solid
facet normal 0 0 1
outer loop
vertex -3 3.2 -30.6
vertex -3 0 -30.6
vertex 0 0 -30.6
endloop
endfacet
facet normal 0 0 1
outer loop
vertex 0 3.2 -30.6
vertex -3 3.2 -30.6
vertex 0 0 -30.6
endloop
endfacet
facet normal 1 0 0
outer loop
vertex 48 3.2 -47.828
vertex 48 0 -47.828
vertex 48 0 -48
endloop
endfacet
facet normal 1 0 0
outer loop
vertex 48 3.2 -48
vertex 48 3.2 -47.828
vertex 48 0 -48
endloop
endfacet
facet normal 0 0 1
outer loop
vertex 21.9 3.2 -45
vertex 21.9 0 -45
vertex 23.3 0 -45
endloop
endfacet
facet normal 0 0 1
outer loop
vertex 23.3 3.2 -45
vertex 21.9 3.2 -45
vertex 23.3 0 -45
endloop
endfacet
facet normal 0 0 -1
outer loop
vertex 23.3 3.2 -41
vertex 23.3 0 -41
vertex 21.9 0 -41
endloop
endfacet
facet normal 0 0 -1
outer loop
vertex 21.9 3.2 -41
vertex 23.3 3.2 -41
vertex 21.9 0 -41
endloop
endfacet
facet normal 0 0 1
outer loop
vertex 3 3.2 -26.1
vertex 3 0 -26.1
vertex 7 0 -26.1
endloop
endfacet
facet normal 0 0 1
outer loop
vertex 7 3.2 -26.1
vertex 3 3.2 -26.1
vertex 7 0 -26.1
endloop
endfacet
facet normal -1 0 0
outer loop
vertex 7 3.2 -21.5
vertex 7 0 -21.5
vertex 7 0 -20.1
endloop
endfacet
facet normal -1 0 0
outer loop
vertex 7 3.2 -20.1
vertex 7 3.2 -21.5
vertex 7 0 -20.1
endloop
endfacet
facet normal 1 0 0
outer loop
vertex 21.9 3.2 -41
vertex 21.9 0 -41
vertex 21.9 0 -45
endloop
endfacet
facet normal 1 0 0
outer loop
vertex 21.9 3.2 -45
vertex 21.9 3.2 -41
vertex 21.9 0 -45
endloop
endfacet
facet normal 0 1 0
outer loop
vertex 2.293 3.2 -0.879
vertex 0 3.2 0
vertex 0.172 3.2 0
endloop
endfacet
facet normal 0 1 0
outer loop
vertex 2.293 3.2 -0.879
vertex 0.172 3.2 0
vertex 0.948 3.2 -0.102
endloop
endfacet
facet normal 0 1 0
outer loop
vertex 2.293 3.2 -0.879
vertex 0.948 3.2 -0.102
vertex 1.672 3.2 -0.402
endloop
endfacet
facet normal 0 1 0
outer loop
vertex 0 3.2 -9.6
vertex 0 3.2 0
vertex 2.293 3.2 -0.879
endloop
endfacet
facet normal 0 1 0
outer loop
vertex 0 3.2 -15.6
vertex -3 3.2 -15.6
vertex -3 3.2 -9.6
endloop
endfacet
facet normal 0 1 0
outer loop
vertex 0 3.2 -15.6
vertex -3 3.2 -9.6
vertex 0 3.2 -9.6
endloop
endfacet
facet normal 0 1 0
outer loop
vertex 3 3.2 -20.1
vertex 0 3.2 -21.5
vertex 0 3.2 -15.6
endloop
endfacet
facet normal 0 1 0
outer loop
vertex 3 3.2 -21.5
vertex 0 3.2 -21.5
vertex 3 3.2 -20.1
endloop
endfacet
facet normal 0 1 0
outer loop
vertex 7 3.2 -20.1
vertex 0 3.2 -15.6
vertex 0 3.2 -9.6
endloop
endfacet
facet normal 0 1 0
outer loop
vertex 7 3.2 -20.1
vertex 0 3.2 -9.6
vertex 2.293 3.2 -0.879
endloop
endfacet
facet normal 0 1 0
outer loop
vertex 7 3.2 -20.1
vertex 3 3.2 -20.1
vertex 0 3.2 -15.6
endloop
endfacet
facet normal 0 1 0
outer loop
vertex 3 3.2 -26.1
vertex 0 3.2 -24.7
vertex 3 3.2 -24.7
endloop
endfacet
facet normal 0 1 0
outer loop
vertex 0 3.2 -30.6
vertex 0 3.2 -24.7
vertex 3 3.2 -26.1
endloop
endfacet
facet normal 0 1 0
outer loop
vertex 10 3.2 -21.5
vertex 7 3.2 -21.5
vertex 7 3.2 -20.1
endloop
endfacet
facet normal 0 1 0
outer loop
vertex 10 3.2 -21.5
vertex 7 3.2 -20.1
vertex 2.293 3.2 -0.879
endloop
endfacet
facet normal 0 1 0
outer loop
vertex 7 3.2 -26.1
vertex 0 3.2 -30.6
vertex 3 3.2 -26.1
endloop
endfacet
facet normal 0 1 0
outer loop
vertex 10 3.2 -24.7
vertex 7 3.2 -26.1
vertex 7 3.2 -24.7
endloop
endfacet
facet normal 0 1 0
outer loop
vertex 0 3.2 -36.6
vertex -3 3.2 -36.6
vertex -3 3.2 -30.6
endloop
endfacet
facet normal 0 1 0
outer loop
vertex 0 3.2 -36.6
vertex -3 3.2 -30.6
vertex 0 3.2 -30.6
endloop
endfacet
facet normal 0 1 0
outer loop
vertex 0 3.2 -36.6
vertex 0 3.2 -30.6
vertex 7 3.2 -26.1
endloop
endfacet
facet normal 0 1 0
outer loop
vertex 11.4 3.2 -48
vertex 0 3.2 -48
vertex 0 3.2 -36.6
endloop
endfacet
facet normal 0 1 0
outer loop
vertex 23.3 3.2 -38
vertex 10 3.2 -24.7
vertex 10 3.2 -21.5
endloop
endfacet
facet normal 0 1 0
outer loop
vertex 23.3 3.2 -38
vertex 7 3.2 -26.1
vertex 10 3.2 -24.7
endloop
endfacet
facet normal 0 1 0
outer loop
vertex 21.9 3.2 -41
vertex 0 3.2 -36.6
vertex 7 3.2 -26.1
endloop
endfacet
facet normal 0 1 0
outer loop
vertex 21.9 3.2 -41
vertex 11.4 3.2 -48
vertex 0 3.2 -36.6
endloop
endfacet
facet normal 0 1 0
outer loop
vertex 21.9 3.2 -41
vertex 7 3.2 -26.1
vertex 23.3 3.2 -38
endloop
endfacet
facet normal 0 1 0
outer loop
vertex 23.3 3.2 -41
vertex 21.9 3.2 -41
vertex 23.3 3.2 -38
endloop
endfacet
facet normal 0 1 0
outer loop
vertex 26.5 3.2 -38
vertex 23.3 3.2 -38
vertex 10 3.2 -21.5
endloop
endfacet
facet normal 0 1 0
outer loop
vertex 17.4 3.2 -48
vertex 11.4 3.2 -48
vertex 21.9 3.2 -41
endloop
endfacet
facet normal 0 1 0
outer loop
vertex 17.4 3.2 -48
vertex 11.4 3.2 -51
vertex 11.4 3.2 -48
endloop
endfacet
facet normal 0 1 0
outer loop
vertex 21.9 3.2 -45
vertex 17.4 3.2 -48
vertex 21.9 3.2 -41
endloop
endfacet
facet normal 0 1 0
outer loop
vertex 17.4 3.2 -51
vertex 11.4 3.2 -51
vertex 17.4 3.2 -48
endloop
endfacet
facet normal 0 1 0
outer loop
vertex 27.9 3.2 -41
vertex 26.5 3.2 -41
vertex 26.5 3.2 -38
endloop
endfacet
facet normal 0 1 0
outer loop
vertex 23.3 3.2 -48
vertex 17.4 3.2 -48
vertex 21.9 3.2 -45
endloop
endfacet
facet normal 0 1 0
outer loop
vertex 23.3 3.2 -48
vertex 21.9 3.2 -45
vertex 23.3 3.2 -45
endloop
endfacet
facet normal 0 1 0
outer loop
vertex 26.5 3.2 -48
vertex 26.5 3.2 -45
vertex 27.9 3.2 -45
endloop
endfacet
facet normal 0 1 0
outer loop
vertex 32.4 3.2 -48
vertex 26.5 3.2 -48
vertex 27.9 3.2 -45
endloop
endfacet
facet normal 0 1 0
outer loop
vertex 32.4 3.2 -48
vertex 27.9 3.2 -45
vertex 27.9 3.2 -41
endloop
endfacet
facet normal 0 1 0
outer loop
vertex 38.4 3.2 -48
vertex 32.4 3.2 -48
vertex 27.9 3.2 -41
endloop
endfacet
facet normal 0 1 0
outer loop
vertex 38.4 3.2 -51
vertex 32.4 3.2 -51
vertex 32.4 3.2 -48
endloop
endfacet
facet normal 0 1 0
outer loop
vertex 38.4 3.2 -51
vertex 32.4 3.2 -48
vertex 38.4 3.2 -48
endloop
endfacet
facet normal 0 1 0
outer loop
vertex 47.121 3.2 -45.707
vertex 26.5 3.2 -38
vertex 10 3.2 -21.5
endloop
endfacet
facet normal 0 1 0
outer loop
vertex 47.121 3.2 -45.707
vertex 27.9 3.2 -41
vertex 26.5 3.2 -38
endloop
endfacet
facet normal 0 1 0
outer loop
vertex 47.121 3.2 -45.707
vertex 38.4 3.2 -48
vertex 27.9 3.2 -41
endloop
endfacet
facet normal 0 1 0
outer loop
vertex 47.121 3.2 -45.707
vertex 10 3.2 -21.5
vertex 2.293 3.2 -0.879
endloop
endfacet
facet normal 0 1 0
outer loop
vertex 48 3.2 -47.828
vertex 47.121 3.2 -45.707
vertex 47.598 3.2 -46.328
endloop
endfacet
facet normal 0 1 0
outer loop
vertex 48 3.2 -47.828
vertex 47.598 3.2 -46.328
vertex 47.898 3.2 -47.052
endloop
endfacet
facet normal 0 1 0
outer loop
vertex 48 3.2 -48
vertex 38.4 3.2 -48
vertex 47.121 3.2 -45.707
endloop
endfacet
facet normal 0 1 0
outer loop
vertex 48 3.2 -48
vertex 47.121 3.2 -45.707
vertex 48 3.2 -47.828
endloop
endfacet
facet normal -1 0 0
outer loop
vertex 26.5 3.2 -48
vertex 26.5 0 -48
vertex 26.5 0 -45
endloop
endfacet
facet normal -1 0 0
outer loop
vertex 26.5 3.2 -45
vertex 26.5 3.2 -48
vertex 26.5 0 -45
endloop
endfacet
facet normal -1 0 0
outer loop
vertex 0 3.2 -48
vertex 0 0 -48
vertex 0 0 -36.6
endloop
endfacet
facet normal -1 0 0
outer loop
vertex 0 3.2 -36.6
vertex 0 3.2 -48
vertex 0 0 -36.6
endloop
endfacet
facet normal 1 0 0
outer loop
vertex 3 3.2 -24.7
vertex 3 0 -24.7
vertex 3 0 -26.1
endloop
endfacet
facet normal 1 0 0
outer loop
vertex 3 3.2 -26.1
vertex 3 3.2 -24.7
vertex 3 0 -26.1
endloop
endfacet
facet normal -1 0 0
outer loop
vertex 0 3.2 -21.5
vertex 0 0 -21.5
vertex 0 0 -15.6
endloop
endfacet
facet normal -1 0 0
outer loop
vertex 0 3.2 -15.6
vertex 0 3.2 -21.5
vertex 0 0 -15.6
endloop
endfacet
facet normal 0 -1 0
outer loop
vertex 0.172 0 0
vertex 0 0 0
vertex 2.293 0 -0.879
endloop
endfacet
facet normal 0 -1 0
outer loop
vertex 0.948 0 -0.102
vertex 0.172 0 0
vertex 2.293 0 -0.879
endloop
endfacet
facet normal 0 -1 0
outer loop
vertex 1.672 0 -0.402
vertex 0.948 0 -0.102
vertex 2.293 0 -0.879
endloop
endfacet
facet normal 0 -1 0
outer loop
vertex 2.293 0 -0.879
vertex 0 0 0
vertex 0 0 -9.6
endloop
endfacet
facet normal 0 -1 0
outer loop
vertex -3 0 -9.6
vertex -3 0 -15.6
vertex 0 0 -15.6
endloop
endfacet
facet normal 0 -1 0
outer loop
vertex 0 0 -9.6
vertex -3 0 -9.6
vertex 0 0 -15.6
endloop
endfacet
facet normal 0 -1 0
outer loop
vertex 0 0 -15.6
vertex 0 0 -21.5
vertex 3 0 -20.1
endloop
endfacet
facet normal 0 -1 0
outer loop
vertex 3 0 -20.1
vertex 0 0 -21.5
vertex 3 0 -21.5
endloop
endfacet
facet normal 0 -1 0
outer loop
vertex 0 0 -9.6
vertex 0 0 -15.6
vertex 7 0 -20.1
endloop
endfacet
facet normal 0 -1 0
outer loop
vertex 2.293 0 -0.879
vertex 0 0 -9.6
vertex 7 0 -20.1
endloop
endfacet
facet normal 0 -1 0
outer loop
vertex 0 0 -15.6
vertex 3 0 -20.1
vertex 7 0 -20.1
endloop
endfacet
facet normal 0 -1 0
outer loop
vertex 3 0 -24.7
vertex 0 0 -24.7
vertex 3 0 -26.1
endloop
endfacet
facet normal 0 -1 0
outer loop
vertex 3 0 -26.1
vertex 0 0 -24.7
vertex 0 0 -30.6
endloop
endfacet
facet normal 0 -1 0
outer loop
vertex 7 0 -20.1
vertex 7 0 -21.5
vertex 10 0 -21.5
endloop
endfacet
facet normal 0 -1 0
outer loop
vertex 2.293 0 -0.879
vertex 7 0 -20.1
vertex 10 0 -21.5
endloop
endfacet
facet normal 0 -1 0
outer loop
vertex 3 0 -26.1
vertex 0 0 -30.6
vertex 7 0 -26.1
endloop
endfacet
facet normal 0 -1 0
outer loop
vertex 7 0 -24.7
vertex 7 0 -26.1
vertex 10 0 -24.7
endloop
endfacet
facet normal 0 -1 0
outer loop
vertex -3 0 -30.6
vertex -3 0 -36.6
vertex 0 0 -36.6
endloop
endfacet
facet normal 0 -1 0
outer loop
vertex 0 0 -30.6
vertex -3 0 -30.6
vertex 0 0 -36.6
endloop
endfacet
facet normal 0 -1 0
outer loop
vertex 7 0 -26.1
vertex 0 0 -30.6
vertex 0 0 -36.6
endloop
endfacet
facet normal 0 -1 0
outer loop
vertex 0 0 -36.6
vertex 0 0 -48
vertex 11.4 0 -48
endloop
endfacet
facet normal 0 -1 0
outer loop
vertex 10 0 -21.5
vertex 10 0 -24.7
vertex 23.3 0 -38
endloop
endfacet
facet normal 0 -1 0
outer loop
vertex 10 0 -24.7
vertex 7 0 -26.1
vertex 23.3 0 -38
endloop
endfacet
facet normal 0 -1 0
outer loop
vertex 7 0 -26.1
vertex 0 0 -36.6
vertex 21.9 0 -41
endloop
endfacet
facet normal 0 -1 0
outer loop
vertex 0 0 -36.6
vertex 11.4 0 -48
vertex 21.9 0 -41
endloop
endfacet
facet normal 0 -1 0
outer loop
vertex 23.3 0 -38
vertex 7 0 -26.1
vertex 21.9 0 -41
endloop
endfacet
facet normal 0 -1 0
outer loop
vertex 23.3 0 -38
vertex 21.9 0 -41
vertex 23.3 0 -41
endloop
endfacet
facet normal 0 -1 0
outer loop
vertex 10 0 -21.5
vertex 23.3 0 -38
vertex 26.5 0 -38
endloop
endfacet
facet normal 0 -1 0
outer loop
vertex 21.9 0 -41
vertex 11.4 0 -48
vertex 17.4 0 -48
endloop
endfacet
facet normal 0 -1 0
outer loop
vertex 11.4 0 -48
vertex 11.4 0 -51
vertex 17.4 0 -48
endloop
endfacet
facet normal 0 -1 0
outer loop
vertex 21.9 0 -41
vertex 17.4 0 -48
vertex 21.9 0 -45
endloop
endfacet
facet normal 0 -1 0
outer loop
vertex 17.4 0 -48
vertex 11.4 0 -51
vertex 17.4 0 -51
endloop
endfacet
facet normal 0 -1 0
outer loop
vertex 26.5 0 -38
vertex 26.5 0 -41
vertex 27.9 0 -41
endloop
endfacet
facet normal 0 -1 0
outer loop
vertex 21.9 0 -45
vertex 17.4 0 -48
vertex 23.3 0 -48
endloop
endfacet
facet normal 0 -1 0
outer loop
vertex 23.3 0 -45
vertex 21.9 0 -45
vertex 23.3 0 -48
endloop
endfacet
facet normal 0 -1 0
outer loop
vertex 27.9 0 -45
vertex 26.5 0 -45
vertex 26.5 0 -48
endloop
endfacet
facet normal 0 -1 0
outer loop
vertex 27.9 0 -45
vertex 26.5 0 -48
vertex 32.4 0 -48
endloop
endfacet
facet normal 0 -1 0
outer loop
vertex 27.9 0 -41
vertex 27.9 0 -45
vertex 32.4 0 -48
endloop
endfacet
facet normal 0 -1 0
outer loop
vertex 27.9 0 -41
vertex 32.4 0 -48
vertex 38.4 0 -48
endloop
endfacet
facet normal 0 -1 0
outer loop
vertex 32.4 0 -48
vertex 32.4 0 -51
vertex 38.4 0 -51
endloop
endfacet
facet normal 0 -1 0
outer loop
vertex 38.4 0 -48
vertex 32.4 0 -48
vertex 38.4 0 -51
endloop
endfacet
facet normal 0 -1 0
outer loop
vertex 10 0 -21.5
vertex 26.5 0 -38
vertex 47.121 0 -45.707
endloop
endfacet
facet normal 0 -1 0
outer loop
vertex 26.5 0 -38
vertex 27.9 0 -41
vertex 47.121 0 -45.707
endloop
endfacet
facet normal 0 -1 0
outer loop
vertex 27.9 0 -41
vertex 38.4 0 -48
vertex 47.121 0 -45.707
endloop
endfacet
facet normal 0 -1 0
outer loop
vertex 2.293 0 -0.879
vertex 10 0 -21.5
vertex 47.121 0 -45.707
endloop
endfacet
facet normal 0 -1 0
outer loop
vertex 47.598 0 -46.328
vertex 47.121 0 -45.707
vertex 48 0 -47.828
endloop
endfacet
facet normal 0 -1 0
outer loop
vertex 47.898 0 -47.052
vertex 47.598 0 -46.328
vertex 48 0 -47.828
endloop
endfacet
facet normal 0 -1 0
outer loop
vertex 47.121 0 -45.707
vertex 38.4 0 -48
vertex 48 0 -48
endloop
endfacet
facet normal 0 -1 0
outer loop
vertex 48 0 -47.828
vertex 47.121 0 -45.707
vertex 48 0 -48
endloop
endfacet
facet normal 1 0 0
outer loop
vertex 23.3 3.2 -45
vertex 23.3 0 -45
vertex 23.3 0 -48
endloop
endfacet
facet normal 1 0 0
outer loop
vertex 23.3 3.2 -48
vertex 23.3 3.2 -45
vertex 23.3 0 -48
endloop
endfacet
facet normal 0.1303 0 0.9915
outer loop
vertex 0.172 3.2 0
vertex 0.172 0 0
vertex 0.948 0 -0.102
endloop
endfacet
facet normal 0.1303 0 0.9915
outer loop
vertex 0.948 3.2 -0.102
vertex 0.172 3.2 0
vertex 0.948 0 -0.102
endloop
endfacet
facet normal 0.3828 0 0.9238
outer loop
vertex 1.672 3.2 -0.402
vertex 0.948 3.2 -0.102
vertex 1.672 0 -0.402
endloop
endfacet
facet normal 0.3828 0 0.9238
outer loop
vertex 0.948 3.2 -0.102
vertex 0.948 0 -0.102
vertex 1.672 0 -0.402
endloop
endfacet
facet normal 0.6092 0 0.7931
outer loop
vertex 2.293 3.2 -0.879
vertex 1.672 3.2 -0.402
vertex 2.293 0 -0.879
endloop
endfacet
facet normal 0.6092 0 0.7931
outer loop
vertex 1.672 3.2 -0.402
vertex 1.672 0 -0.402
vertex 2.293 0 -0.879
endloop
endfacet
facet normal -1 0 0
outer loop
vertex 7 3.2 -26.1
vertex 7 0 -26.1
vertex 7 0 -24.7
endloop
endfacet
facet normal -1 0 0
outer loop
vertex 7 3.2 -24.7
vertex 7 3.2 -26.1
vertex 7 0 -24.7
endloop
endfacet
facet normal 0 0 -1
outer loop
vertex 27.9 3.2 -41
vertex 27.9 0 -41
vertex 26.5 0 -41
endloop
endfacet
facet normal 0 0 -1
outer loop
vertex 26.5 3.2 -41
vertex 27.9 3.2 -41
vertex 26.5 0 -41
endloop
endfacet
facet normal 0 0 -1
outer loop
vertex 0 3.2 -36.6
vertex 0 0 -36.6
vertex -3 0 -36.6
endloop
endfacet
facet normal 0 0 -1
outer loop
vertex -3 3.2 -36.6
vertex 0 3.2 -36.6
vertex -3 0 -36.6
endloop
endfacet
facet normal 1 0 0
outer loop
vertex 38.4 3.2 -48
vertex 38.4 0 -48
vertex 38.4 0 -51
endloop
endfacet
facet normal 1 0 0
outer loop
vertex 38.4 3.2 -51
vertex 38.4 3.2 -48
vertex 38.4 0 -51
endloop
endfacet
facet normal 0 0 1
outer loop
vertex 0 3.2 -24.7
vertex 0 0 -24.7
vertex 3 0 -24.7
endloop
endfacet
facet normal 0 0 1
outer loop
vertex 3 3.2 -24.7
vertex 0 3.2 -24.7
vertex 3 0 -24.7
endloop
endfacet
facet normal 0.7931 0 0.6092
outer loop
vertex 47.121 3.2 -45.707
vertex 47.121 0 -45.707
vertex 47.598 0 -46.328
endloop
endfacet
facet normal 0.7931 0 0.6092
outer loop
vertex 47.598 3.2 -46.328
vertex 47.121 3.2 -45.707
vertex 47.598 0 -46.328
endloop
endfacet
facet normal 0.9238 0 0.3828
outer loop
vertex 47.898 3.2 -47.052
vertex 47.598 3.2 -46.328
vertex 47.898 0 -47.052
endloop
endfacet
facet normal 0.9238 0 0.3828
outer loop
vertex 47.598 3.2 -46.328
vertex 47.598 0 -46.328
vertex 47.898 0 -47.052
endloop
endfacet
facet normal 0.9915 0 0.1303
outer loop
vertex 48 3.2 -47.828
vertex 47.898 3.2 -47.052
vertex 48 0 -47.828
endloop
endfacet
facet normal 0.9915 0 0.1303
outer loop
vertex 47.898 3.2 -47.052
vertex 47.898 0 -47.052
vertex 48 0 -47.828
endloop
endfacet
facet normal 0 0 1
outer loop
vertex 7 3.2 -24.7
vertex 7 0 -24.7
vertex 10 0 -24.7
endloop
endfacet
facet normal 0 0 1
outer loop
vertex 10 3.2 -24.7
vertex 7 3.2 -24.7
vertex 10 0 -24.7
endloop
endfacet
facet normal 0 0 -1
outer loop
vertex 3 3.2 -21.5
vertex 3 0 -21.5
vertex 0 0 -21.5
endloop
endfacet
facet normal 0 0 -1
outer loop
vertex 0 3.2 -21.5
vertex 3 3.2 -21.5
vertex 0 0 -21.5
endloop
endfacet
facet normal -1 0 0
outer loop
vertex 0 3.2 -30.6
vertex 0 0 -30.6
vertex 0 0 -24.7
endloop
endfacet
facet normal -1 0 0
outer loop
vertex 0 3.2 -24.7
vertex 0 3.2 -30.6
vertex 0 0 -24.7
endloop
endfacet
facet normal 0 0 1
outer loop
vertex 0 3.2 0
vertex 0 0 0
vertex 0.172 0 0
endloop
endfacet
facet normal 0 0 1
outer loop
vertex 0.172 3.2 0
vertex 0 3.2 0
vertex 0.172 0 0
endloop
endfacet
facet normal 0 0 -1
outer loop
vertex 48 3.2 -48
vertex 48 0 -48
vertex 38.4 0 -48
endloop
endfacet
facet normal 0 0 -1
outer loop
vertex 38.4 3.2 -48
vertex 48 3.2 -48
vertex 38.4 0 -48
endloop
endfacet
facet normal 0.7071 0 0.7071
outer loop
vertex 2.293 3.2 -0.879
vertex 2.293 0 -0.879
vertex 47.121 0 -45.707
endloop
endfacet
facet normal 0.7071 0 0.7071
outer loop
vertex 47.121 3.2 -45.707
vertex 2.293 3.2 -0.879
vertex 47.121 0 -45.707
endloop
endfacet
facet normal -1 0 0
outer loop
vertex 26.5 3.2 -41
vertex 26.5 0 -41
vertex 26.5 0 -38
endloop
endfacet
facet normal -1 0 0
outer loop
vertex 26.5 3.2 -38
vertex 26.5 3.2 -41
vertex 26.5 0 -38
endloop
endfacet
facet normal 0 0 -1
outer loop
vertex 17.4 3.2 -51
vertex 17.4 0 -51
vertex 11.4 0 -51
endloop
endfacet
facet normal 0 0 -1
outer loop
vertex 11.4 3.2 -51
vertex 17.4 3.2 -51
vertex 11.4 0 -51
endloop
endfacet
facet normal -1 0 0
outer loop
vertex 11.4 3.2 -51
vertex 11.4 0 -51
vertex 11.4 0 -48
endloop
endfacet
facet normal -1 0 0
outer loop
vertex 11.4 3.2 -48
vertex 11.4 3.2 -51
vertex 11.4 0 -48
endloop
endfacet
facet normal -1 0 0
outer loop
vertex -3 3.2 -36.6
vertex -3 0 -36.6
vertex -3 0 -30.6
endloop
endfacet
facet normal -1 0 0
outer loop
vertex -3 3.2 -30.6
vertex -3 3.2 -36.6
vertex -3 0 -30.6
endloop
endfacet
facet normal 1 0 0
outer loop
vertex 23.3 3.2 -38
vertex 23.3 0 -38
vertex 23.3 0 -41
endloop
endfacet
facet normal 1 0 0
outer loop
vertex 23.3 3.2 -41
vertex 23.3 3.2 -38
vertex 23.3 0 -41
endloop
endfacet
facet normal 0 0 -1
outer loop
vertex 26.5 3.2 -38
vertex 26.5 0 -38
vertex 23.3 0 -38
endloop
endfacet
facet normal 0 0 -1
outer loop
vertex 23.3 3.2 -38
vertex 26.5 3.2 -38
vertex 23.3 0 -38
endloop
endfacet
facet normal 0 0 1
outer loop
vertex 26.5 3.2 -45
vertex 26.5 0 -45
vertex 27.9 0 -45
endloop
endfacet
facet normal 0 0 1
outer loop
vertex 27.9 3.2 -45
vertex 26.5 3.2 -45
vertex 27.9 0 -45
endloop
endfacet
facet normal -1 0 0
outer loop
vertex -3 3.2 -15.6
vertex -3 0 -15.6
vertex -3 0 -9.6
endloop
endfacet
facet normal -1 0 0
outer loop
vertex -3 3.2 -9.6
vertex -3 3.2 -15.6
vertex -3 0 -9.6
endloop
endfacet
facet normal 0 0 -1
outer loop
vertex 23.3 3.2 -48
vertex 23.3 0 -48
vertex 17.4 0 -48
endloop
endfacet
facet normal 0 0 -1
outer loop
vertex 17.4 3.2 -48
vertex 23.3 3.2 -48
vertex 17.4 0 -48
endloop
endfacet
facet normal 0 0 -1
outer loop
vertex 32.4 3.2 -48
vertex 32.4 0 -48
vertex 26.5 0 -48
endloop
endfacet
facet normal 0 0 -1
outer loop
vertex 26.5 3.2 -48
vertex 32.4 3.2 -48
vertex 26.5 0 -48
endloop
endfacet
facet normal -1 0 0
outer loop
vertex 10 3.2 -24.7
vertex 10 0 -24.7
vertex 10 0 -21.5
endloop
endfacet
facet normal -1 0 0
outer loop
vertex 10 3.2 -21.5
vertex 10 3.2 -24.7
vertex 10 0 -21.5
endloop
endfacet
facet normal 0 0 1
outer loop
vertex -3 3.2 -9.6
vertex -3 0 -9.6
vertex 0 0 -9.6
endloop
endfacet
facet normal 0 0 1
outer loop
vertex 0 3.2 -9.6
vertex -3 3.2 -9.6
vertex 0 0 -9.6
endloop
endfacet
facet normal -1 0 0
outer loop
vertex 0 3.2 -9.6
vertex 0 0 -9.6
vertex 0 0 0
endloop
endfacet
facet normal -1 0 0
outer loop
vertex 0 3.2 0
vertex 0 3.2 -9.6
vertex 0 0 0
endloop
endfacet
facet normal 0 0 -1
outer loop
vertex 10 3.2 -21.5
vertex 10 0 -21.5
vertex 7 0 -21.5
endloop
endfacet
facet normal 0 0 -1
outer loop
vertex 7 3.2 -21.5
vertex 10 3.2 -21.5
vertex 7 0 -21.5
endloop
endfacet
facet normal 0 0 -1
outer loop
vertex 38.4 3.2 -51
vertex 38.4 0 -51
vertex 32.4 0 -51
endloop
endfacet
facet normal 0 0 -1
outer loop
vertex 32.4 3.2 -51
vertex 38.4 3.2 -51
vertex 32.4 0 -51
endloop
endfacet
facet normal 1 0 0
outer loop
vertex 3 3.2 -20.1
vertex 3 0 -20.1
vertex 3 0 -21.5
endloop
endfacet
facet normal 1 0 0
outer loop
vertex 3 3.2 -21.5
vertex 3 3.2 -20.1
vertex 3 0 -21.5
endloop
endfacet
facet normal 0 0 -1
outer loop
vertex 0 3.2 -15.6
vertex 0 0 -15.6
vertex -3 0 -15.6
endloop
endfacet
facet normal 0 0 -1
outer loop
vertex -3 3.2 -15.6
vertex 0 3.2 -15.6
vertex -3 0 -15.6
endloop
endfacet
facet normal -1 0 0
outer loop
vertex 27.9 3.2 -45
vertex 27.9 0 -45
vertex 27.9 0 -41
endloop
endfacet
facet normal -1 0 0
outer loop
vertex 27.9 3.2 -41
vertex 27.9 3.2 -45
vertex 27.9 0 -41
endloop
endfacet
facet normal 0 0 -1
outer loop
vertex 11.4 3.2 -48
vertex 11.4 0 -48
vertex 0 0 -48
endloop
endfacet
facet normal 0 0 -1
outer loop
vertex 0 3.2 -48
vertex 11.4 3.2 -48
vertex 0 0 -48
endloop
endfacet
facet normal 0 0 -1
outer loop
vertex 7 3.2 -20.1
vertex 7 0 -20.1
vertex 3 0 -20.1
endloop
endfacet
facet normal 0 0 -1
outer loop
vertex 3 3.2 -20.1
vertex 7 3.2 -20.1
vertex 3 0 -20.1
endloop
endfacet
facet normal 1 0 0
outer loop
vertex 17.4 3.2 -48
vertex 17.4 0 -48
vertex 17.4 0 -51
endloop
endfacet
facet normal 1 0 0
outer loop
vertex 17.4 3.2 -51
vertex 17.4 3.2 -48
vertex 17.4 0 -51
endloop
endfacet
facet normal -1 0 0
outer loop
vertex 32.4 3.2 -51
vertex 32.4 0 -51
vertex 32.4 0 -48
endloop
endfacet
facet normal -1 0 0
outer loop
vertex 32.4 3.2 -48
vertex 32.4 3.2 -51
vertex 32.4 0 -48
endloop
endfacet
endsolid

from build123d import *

# Parameters (mm, degrees)
SALIENTE_EXTRUIR2_DEPTH = 3.2


with BuildPart() as part:
    # Croquis1 → Saliente-Extruir2 (new body)
    with BuildSketch(Plane(origin=(0, 0, 0), x_dir=(1, 0, 0), z_dir=(0, 1, 0))):
        with BuildLine():
            Line((10, 21.5), (7, 21.5))
            Line((7, 21.5), (7, 20.1))
            Line((7, 20.1), (3, 20.1))
            Line((3, 20.1), (3, 21.5))
            Line((3, 21.5), (0, 21.5))
            Line((0, 21.5), (0, 15.6))
            Line((0, 15.6), (-3, 15.6))
            Line((-3, 15.6), (-3, 9.6))
            Line((-3, 9.6), (0, 9.6))
            Line((0, 9.6), (0, 0))
            Line((0, 0), (0.171572875, 0))
            ThreePointArc((0.171572875, 0), (1.319623172, 0.228361402), (2.292893219, 0.878679656))
            Line((2.292893219, 0.878679656), (47.121320344, 45.707106781))
            ThreePointArc((47.121320344, 45.707106781), (47.771638598, 46.680376828), (48, 47.828427125))
            Line((48, 47.828427125), (48, 48))
            Line((48, 48), (38.4, 48))
            Line((38.4, 48), (38.4, 51))
            Line((38.4, 51), (32.4, 51))
            Line((32.4, 51), (32.4, 48))
            Line((32.4, 48), (26.5, 48))
            Line((26.5, 48), (26.5, 45))
            Line((26.5, 45), (27.9, 45))
            Line((27.9, 45), (27.9, 41))
            Line((27.9, 41), (26.5, 41))
            Line((26.5, 41), (26.5, 38))
            Line((26.5, 38), (23.3, 38))
            Line((23.3, 38), (23.3, 41))
            Line((23.3, 41), (21.9, 41))
            Line((21.9, 41), (21.9, 45))
            Line((21.9, 45), (23.3, 45))
            Line((23.3, 45), (23.3, 48))
            Line((23.3, 48), (17.4, 48))
            Line((17.4, 48), (17.4, 51))
            Line((17.4, 51), (11.4, 51))
            Line((11.4, 51), (11.4, 48))
            Line((11.4, 48), (0, 48))
            Line((0, 48), (0, 36.6))
            Line((0, 36.6), (-3, 36.6))
            Line((-3, 36.6), (-3, 30.6))
            Line((-3, 30.6), (0, 30.6))
            Line((0, 30.6), (0, 24.7))
            Line((0, 24.7), (3, 24.7))
            Line((3, 24.7), (3, 26.1))
            Line((3, 26.1), (7, 26.1))
            Line((7, 26.1), (7, 24.7))
            Line((7, 24.7), (10, 24.7))
            Line((10, 24.7), (10, 21.5))
        make_face()
    extrude(amount=SALIENTE_EXTRUIR2_DEPTH)


solid = part.part
